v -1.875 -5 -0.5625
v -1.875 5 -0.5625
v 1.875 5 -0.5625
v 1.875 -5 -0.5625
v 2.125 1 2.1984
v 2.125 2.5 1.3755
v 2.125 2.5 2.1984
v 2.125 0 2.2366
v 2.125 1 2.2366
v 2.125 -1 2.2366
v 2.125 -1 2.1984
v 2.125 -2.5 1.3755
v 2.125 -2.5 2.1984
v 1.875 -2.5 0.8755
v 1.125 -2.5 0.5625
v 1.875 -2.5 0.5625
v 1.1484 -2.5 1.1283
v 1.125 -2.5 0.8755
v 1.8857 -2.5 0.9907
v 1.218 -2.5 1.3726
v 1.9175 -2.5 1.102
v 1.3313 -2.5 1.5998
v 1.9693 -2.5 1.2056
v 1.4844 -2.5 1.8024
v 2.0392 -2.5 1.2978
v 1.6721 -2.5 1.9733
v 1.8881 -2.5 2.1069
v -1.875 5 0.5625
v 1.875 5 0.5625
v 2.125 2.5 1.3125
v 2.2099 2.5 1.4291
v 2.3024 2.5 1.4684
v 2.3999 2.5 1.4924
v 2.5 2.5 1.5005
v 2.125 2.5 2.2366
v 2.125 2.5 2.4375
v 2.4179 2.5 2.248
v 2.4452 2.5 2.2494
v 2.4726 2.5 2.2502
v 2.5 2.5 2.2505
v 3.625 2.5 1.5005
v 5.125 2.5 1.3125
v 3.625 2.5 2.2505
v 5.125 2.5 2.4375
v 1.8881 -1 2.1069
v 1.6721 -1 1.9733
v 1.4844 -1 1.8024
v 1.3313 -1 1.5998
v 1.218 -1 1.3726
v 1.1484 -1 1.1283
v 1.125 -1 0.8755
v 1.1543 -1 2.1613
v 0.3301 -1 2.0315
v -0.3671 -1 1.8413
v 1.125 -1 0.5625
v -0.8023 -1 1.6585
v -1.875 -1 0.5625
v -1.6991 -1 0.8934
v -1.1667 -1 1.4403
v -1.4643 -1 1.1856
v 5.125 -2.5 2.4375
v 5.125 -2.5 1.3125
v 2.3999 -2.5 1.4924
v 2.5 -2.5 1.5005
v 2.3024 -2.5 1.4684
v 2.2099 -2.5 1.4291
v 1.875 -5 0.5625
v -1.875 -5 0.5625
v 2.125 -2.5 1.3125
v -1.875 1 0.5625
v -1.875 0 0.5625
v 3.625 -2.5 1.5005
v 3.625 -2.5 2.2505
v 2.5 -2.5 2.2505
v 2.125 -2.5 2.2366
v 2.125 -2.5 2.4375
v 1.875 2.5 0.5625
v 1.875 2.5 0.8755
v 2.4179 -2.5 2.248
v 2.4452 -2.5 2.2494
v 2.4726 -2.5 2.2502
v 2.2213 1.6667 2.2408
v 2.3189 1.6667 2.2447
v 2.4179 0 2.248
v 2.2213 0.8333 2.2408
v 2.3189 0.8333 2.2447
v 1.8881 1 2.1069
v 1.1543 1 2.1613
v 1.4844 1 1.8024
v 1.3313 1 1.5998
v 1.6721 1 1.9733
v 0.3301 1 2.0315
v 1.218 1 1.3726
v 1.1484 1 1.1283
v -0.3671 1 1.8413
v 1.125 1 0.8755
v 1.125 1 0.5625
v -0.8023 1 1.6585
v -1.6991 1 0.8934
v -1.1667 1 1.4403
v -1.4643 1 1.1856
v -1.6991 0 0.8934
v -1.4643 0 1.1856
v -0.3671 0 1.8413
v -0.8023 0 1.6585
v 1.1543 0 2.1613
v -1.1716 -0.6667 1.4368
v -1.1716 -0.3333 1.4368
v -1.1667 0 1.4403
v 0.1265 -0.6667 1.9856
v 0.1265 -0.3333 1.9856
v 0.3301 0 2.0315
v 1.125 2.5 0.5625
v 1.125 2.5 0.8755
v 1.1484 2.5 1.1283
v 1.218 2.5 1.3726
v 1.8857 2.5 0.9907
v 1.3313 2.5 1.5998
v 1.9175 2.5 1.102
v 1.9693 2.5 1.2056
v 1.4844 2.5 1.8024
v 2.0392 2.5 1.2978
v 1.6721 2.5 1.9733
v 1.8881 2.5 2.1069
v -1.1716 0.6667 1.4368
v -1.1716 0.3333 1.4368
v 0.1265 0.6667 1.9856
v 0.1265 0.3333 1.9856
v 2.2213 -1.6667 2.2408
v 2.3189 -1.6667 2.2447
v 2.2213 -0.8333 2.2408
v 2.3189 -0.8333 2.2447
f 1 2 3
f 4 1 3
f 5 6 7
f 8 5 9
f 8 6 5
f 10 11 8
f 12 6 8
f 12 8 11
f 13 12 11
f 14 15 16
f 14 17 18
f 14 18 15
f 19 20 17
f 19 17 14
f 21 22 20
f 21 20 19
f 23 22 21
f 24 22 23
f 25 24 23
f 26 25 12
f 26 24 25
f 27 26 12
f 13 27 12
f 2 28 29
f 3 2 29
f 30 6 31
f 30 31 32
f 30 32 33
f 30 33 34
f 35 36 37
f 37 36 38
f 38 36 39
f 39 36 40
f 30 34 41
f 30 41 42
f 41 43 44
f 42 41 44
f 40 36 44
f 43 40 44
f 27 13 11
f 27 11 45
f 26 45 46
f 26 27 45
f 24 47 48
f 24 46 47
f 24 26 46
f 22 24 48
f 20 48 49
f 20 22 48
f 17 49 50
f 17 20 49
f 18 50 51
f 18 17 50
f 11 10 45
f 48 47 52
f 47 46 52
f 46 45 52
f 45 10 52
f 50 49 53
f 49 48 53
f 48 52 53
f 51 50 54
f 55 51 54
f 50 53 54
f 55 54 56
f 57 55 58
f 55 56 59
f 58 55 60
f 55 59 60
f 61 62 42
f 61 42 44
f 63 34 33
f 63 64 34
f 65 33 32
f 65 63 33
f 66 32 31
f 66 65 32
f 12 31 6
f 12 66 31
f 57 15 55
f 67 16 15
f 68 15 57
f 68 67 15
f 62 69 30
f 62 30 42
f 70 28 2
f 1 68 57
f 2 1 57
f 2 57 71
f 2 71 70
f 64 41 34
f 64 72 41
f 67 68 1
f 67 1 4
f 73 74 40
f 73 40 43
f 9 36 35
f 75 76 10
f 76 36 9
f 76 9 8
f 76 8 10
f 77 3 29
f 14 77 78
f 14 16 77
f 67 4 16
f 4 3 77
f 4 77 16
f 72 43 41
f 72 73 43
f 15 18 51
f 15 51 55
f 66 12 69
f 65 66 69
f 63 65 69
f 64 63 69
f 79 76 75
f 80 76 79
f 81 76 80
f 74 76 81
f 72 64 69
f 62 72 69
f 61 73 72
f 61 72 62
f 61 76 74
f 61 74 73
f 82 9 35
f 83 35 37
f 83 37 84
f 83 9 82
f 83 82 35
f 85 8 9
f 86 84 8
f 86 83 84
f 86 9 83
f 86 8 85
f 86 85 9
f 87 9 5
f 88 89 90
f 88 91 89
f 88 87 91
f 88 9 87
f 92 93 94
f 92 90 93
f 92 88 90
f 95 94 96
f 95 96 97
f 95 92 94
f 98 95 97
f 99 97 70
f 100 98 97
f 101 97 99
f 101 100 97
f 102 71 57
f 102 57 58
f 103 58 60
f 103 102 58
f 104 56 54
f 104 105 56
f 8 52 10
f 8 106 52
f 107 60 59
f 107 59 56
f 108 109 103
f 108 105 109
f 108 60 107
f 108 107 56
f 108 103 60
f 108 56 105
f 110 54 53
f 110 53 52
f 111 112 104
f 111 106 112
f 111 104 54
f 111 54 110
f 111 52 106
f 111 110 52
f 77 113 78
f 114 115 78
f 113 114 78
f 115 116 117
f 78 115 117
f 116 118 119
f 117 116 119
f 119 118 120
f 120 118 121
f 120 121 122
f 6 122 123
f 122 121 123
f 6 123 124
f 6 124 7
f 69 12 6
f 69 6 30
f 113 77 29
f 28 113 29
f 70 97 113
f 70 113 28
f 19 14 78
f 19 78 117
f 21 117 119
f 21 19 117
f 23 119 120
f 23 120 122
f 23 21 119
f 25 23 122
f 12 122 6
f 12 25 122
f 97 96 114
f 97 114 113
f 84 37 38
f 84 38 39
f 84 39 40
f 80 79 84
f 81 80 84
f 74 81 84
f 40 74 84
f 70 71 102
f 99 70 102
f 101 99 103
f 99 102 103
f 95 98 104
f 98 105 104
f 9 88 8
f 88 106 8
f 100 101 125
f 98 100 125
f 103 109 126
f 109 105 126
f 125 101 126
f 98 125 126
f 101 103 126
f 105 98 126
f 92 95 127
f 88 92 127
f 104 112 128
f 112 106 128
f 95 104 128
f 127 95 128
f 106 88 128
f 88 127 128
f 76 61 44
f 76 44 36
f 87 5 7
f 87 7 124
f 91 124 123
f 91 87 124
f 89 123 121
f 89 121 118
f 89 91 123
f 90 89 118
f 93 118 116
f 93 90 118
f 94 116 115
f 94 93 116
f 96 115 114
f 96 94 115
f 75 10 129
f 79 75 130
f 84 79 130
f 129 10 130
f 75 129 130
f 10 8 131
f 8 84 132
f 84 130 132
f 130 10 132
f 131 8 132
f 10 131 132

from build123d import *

# Parameters (mm, degrees)
F1_DEPTH = 5
F2_DEPTH = 2.5
F3_DEPTH = 1


with BuildPart() as f1:
    # F0 (on Front) → F1 (new body, symmetric)
    with BuildSketch(Plane.XZ):
        Polygon((-1.875, 0.5625), (-1.875, -0.5625), (1.875, -0.5625), (1.875, 0.5625), (1.125, 0.5625), align=None)
    extrude(amount=F1_DEPTH, both=True)

    # F0 (on Front) → F2 (join, symmetric)
    with BuildSketch(Plane.XZ):
        with BuildLine():
            Line((2.125, 2.4375), (2.125, 2.236595))
            add(Edge.make_bspline(
                [(2.125, 2.236595), (2.220664, 2.241061), (2.318275, 2.244875), (2.417864, 2.248045)],
                knots=[4.461362, 4.461362, 4.461362, 4.461362, 4.640393, 4.640393, 4.640393, 4.640393], degree=3))
            ThreePointArc((2.417864, 2.248045), (2.458913, 2.249886), (2.5, 2.2505))
            Line((2.5, 2.2505), (3.625, 2.2505))
            Line((3.625, 2.2505), (3.625, 1.5005))
            Line((3.625, 1.5005), (2.5, 1.5005))
            ThreePointArc((2.5, 1.5005), (2.302358, 1.468427), (2.125, 1.3755))
            Line((2.125, 1.3755), (2.125, 1.3125))
            Line((2.125, 1.3125), (5.125, 1.3125))
            Line((5.125, 1.3125), (5.125, 2.4375))
            Line((5.125, 2.4375), (2.125, 2.4375))
        make_face()
        with BuildLine():
            Line((1.125, 0.5625), (1.875, 0.5625))
            Line((1.875, 0.5625), (1.875, 0.8755))
            ThreePointArc((1.875, 0.8755), (1.940983, 1.155008), (2.125, 1.3755))
            Line((2.125, 1.3755), (2.125, 2.198376))
            ThreePointArc((2.125, 2.198376), (1.403129, 1.704656), (1.125, 0.8755))
            Line((1.125, 0.8755), (1.125, 0.5625))
        make_face()
    extrude(amount=F2_DEPTH, both=True)

    # F0 (on Front) → F3 (join, symmetric)
    with BuildSketch(Plane.XZ):
        with BuildLine():
            add(Edge.make_bspline(
                [(-1.875, 0.5625), (-1.433764, 1.608831), (-0.258898, 2.125299), (2.125, 2.236595)],
                knots=[0, 0, 0, 0, 4.461362, 4.461362, 4.461362, 4.461362], degree=3))
            Line((-1.875, 0.5625), (1.125, 0.5625))
            Line((1.125, 0.5625), (1.125, 0.8755))
            ThreePointArc((1.125, 0.8755), (1.403129, 1.704656), (2.125, 2.198376))
            Line((2.125, 2.198376), (2.125, 2.236595))
        make_face()
    extrude(amount=F3_DEPTH, both=True)


solid = f1.part
